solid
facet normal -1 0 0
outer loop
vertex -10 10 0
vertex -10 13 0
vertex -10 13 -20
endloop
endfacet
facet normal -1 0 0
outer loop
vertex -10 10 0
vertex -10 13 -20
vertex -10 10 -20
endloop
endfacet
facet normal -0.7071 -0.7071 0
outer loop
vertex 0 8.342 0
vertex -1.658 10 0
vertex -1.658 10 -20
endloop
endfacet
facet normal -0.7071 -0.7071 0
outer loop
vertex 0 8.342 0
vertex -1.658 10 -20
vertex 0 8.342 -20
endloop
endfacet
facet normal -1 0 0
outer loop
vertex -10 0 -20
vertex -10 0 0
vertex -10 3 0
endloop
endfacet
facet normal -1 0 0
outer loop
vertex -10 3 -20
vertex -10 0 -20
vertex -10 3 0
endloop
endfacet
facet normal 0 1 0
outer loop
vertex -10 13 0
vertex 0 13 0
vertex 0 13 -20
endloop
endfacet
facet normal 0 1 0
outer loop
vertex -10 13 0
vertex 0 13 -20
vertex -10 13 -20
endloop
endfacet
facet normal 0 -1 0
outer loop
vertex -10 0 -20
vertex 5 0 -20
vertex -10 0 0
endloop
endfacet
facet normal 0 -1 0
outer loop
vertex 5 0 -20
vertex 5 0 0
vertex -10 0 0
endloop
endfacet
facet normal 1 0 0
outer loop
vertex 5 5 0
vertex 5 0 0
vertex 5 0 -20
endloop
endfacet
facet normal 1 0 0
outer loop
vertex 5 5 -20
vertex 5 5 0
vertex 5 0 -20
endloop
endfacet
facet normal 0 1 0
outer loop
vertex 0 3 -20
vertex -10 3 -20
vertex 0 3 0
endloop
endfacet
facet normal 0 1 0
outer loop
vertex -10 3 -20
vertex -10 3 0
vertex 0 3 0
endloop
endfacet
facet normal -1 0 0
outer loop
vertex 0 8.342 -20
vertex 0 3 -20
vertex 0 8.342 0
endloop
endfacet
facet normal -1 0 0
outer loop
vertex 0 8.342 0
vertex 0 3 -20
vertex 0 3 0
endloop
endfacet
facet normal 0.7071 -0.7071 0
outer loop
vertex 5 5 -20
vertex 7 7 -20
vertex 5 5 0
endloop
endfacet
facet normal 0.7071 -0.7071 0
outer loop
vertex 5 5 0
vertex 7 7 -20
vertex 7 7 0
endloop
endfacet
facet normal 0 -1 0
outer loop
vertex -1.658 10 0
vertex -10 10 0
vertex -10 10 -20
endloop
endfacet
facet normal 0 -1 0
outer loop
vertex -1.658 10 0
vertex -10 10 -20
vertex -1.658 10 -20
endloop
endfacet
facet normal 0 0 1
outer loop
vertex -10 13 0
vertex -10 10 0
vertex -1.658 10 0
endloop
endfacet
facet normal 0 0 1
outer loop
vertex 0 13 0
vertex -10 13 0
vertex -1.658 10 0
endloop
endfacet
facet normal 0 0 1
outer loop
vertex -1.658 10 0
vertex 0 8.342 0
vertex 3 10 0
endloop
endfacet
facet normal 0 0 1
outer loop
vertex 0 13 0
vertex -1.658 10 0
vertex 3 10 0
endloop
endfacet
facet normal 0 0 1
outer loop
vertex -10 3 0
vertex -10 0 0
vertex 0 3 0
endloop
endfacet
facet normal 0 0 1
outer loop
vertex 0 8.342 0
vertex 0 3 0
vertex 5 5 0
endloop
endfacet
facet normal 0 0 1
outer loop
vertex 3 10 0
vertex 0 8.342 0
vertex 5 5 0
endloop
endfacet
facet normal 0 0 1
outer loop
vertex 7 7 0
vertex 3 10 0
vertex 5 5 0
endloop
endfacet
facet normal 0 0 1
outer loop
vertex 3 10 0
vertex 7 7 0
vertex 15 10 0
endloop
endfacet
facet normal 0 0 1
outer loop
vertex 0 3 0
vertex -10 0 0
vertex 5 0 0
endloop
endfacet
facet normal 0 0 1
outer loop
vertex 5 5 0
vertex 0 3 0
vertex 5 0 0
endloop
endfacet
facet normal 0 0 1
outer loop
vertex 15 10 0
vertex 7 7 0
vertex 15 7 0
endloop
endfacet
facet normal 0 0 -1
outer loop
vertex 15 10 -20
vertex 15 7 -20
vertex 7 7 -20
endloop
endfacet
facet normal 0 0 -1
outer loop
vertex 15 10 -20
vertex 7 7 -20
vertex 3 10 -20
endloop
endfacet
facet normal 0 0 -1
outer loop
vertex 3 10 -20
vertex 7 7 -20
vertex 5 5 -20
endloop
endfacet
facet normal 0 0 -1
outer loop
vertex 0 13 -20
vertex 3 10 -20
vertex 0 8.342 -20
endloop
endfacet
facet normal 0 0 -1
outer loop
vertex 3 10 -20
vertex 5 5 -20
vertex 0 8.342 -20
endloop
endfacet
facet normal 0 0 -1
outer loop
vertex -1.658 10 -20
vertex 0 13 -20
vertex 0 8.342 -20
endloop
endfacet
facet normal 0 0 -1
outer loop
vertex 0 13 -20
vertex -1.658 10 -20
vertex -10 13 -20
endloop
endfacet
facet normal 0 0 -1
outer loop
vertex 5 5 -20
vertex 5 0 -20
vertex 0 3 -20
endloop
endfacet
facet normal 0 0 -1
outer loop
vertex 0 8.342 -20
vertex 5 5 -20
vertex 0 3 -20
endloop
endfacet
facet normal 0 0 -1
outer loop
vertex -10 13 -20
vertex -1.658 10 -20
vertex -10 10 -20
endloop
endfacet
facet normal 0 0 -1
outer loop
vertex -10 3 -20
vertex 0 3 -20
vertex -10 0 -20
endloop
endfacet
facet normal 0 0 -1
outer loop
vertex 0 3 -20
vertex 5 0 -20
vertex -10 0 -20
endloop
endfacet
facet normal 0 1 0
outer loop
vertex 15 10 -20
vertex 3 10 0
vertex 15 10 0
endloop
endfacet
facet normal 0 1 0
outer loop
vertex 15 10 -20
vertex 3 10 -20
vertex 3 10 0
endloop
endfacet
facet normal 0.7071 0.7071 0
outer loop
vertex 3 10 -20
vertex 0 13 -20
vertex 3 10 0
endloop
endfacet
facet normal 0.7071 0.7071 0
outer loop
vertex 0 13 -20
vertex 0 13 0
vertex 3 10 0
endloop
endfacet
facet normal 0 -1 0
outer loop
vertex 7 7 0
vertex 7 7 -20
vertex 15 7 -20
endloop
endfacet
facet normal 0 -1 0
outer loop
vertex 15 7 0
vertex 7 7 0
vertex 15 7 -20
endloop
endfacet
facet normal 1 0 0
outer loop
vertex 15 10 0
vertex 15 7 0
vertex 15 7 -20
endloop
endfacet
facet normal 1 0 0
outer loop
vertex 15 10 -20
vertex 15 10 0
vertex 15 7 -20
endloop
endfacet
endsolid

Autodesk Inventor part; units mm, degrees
ref_plane "YZ Plane" through (0, 0, 0) normal (1, 0, 0) x (0, 1, 0)
ref_plane "XZ Plane" through (0, 0, 0) normal (0, 1, 0) x (-1, 0, 0)
ref_plane "XY Plane" through (0, 0, 0) normal (0, 0, 1) x (1, 0, 0)
sketch "Эскиз1" plane through (0, 0, 0) normal (0, 1, 0) x (-1, 0, 0)
  line L0 (0, 0) -> (-5, 0)
  line L1 (-5, 0) -> (-5, -20)
  line L2 (-5, -20) -> (0, -20)
  line L3 (0, -20) -> (0, 0)
  dimension "d0" = 5
  dimension "d1" = 20
extrude "Выдавливание1" add sketch "Эскиз1" along normal blind 7
sketch "Эскиз2" plane through (0, 7, 0) normal (0, 1, 0) x (1, 0, 0)
  line L0 (0, 0) -> (5, 0) projected
  line L1 (5, 0) -> (5, 20) projected
  line L2 (5, 20) -> (0, 20) projected
  line L3 (0, 20) -> (0, 0) projected
  line L4 (0, 0) -> (5, 0) projected
  line L5 (5, 0) -> (15, 0)
  line L6 (15, 0) -> (15, 20)
  line L7 (15, 20) -> (5, 20)
  line L8 (5, 20) -> (5, 0)
  dimension "d4" = 10
  dimension "d5" = 20
extrude "Выдавливание2" add sketch "Эскиз2" along normal blind 3
chamfer "Фаска1" distance 2 angle 45 1 edges at (5, 7, -10)
sketch "Эскиз3" plane through (0, 0, 0) normal (0, 0, 1) x (1, 0, 0)
  line L0 (0, 0) -> (25, 0)
  line L1 (25, 0) -> (25, 3)
  line L2 (25, 3) -> (0, 3)
  line L3 (0, 3) -> (0, 0)
  line L4 (0, 0) -> (5, 0) construction
  line L5 (5, 0) -> (5, 5) construction
  line L6 (7, 7) -> (5, 5) construction
  line L7 (7, 7) -> (15, 7) construction
  line L8 (15, 7) -> (15, 10) construction
  line L9 (0, 10) -> (15, 10) construction
  line L10 (0, 0) -> (0, 10) construction
  line L11 (0, 3) -> (5, 3)
  line L12 (5, 3) -> (5, 13)
  line L13 (5, 13) -> (0, 13)
  line L14 (0, 13) -> (0, 3)
  line L15 (5, 13) -> (15, 13)
  line L16 (15, 13) -> (15, 10)
  line L17 (15, 10) -> (5, 10)
  line L18 (5, 10) -> (5, 13)
  line L19 (0, 0) -> (5, 0) projected
  line L20 (0, 0) -> (-10, 0)
  line L21 (-10, 0) -> (-10, 3)
  line L22 (-10, 3) -> (0, 3)
  line L23 (0, 3) -> (0, 0)
  line L24 (0, 13) -> (-10, 13)
  line L25 (-10, 13) -> (-10, 10)
  line L26 (-10, 10) -> (0, 10)
  line L27 (0, 10) -> (0, 13)
  line L28 (0, 13) -> (3, 10)
  line L29 (0, 10) -> (15, 10) projected
  line L30 (-1.6585, 10) -> (0, 8.3415)
  line L31 (0, 0) -> (0, 10) projected
  point P0 (0, 8.3415)
  dimension "d11" = 3
  dimension "d12" = 25
  dimension "d13" = 5
  dimension "d14" = 10
  dimension "d15" = 10
  dimension "d16" = 3
  dimension "d17" = 10
  dimension "d18" = 3
extrude "Выдавливание3" add sketch "Эскиз3" against normal blind 20 contours L20 L21 L22 L3 | L30 L26 L14 | L26 L25 L24 L14 | L14 L28 L29
properties part number "test_support2"
